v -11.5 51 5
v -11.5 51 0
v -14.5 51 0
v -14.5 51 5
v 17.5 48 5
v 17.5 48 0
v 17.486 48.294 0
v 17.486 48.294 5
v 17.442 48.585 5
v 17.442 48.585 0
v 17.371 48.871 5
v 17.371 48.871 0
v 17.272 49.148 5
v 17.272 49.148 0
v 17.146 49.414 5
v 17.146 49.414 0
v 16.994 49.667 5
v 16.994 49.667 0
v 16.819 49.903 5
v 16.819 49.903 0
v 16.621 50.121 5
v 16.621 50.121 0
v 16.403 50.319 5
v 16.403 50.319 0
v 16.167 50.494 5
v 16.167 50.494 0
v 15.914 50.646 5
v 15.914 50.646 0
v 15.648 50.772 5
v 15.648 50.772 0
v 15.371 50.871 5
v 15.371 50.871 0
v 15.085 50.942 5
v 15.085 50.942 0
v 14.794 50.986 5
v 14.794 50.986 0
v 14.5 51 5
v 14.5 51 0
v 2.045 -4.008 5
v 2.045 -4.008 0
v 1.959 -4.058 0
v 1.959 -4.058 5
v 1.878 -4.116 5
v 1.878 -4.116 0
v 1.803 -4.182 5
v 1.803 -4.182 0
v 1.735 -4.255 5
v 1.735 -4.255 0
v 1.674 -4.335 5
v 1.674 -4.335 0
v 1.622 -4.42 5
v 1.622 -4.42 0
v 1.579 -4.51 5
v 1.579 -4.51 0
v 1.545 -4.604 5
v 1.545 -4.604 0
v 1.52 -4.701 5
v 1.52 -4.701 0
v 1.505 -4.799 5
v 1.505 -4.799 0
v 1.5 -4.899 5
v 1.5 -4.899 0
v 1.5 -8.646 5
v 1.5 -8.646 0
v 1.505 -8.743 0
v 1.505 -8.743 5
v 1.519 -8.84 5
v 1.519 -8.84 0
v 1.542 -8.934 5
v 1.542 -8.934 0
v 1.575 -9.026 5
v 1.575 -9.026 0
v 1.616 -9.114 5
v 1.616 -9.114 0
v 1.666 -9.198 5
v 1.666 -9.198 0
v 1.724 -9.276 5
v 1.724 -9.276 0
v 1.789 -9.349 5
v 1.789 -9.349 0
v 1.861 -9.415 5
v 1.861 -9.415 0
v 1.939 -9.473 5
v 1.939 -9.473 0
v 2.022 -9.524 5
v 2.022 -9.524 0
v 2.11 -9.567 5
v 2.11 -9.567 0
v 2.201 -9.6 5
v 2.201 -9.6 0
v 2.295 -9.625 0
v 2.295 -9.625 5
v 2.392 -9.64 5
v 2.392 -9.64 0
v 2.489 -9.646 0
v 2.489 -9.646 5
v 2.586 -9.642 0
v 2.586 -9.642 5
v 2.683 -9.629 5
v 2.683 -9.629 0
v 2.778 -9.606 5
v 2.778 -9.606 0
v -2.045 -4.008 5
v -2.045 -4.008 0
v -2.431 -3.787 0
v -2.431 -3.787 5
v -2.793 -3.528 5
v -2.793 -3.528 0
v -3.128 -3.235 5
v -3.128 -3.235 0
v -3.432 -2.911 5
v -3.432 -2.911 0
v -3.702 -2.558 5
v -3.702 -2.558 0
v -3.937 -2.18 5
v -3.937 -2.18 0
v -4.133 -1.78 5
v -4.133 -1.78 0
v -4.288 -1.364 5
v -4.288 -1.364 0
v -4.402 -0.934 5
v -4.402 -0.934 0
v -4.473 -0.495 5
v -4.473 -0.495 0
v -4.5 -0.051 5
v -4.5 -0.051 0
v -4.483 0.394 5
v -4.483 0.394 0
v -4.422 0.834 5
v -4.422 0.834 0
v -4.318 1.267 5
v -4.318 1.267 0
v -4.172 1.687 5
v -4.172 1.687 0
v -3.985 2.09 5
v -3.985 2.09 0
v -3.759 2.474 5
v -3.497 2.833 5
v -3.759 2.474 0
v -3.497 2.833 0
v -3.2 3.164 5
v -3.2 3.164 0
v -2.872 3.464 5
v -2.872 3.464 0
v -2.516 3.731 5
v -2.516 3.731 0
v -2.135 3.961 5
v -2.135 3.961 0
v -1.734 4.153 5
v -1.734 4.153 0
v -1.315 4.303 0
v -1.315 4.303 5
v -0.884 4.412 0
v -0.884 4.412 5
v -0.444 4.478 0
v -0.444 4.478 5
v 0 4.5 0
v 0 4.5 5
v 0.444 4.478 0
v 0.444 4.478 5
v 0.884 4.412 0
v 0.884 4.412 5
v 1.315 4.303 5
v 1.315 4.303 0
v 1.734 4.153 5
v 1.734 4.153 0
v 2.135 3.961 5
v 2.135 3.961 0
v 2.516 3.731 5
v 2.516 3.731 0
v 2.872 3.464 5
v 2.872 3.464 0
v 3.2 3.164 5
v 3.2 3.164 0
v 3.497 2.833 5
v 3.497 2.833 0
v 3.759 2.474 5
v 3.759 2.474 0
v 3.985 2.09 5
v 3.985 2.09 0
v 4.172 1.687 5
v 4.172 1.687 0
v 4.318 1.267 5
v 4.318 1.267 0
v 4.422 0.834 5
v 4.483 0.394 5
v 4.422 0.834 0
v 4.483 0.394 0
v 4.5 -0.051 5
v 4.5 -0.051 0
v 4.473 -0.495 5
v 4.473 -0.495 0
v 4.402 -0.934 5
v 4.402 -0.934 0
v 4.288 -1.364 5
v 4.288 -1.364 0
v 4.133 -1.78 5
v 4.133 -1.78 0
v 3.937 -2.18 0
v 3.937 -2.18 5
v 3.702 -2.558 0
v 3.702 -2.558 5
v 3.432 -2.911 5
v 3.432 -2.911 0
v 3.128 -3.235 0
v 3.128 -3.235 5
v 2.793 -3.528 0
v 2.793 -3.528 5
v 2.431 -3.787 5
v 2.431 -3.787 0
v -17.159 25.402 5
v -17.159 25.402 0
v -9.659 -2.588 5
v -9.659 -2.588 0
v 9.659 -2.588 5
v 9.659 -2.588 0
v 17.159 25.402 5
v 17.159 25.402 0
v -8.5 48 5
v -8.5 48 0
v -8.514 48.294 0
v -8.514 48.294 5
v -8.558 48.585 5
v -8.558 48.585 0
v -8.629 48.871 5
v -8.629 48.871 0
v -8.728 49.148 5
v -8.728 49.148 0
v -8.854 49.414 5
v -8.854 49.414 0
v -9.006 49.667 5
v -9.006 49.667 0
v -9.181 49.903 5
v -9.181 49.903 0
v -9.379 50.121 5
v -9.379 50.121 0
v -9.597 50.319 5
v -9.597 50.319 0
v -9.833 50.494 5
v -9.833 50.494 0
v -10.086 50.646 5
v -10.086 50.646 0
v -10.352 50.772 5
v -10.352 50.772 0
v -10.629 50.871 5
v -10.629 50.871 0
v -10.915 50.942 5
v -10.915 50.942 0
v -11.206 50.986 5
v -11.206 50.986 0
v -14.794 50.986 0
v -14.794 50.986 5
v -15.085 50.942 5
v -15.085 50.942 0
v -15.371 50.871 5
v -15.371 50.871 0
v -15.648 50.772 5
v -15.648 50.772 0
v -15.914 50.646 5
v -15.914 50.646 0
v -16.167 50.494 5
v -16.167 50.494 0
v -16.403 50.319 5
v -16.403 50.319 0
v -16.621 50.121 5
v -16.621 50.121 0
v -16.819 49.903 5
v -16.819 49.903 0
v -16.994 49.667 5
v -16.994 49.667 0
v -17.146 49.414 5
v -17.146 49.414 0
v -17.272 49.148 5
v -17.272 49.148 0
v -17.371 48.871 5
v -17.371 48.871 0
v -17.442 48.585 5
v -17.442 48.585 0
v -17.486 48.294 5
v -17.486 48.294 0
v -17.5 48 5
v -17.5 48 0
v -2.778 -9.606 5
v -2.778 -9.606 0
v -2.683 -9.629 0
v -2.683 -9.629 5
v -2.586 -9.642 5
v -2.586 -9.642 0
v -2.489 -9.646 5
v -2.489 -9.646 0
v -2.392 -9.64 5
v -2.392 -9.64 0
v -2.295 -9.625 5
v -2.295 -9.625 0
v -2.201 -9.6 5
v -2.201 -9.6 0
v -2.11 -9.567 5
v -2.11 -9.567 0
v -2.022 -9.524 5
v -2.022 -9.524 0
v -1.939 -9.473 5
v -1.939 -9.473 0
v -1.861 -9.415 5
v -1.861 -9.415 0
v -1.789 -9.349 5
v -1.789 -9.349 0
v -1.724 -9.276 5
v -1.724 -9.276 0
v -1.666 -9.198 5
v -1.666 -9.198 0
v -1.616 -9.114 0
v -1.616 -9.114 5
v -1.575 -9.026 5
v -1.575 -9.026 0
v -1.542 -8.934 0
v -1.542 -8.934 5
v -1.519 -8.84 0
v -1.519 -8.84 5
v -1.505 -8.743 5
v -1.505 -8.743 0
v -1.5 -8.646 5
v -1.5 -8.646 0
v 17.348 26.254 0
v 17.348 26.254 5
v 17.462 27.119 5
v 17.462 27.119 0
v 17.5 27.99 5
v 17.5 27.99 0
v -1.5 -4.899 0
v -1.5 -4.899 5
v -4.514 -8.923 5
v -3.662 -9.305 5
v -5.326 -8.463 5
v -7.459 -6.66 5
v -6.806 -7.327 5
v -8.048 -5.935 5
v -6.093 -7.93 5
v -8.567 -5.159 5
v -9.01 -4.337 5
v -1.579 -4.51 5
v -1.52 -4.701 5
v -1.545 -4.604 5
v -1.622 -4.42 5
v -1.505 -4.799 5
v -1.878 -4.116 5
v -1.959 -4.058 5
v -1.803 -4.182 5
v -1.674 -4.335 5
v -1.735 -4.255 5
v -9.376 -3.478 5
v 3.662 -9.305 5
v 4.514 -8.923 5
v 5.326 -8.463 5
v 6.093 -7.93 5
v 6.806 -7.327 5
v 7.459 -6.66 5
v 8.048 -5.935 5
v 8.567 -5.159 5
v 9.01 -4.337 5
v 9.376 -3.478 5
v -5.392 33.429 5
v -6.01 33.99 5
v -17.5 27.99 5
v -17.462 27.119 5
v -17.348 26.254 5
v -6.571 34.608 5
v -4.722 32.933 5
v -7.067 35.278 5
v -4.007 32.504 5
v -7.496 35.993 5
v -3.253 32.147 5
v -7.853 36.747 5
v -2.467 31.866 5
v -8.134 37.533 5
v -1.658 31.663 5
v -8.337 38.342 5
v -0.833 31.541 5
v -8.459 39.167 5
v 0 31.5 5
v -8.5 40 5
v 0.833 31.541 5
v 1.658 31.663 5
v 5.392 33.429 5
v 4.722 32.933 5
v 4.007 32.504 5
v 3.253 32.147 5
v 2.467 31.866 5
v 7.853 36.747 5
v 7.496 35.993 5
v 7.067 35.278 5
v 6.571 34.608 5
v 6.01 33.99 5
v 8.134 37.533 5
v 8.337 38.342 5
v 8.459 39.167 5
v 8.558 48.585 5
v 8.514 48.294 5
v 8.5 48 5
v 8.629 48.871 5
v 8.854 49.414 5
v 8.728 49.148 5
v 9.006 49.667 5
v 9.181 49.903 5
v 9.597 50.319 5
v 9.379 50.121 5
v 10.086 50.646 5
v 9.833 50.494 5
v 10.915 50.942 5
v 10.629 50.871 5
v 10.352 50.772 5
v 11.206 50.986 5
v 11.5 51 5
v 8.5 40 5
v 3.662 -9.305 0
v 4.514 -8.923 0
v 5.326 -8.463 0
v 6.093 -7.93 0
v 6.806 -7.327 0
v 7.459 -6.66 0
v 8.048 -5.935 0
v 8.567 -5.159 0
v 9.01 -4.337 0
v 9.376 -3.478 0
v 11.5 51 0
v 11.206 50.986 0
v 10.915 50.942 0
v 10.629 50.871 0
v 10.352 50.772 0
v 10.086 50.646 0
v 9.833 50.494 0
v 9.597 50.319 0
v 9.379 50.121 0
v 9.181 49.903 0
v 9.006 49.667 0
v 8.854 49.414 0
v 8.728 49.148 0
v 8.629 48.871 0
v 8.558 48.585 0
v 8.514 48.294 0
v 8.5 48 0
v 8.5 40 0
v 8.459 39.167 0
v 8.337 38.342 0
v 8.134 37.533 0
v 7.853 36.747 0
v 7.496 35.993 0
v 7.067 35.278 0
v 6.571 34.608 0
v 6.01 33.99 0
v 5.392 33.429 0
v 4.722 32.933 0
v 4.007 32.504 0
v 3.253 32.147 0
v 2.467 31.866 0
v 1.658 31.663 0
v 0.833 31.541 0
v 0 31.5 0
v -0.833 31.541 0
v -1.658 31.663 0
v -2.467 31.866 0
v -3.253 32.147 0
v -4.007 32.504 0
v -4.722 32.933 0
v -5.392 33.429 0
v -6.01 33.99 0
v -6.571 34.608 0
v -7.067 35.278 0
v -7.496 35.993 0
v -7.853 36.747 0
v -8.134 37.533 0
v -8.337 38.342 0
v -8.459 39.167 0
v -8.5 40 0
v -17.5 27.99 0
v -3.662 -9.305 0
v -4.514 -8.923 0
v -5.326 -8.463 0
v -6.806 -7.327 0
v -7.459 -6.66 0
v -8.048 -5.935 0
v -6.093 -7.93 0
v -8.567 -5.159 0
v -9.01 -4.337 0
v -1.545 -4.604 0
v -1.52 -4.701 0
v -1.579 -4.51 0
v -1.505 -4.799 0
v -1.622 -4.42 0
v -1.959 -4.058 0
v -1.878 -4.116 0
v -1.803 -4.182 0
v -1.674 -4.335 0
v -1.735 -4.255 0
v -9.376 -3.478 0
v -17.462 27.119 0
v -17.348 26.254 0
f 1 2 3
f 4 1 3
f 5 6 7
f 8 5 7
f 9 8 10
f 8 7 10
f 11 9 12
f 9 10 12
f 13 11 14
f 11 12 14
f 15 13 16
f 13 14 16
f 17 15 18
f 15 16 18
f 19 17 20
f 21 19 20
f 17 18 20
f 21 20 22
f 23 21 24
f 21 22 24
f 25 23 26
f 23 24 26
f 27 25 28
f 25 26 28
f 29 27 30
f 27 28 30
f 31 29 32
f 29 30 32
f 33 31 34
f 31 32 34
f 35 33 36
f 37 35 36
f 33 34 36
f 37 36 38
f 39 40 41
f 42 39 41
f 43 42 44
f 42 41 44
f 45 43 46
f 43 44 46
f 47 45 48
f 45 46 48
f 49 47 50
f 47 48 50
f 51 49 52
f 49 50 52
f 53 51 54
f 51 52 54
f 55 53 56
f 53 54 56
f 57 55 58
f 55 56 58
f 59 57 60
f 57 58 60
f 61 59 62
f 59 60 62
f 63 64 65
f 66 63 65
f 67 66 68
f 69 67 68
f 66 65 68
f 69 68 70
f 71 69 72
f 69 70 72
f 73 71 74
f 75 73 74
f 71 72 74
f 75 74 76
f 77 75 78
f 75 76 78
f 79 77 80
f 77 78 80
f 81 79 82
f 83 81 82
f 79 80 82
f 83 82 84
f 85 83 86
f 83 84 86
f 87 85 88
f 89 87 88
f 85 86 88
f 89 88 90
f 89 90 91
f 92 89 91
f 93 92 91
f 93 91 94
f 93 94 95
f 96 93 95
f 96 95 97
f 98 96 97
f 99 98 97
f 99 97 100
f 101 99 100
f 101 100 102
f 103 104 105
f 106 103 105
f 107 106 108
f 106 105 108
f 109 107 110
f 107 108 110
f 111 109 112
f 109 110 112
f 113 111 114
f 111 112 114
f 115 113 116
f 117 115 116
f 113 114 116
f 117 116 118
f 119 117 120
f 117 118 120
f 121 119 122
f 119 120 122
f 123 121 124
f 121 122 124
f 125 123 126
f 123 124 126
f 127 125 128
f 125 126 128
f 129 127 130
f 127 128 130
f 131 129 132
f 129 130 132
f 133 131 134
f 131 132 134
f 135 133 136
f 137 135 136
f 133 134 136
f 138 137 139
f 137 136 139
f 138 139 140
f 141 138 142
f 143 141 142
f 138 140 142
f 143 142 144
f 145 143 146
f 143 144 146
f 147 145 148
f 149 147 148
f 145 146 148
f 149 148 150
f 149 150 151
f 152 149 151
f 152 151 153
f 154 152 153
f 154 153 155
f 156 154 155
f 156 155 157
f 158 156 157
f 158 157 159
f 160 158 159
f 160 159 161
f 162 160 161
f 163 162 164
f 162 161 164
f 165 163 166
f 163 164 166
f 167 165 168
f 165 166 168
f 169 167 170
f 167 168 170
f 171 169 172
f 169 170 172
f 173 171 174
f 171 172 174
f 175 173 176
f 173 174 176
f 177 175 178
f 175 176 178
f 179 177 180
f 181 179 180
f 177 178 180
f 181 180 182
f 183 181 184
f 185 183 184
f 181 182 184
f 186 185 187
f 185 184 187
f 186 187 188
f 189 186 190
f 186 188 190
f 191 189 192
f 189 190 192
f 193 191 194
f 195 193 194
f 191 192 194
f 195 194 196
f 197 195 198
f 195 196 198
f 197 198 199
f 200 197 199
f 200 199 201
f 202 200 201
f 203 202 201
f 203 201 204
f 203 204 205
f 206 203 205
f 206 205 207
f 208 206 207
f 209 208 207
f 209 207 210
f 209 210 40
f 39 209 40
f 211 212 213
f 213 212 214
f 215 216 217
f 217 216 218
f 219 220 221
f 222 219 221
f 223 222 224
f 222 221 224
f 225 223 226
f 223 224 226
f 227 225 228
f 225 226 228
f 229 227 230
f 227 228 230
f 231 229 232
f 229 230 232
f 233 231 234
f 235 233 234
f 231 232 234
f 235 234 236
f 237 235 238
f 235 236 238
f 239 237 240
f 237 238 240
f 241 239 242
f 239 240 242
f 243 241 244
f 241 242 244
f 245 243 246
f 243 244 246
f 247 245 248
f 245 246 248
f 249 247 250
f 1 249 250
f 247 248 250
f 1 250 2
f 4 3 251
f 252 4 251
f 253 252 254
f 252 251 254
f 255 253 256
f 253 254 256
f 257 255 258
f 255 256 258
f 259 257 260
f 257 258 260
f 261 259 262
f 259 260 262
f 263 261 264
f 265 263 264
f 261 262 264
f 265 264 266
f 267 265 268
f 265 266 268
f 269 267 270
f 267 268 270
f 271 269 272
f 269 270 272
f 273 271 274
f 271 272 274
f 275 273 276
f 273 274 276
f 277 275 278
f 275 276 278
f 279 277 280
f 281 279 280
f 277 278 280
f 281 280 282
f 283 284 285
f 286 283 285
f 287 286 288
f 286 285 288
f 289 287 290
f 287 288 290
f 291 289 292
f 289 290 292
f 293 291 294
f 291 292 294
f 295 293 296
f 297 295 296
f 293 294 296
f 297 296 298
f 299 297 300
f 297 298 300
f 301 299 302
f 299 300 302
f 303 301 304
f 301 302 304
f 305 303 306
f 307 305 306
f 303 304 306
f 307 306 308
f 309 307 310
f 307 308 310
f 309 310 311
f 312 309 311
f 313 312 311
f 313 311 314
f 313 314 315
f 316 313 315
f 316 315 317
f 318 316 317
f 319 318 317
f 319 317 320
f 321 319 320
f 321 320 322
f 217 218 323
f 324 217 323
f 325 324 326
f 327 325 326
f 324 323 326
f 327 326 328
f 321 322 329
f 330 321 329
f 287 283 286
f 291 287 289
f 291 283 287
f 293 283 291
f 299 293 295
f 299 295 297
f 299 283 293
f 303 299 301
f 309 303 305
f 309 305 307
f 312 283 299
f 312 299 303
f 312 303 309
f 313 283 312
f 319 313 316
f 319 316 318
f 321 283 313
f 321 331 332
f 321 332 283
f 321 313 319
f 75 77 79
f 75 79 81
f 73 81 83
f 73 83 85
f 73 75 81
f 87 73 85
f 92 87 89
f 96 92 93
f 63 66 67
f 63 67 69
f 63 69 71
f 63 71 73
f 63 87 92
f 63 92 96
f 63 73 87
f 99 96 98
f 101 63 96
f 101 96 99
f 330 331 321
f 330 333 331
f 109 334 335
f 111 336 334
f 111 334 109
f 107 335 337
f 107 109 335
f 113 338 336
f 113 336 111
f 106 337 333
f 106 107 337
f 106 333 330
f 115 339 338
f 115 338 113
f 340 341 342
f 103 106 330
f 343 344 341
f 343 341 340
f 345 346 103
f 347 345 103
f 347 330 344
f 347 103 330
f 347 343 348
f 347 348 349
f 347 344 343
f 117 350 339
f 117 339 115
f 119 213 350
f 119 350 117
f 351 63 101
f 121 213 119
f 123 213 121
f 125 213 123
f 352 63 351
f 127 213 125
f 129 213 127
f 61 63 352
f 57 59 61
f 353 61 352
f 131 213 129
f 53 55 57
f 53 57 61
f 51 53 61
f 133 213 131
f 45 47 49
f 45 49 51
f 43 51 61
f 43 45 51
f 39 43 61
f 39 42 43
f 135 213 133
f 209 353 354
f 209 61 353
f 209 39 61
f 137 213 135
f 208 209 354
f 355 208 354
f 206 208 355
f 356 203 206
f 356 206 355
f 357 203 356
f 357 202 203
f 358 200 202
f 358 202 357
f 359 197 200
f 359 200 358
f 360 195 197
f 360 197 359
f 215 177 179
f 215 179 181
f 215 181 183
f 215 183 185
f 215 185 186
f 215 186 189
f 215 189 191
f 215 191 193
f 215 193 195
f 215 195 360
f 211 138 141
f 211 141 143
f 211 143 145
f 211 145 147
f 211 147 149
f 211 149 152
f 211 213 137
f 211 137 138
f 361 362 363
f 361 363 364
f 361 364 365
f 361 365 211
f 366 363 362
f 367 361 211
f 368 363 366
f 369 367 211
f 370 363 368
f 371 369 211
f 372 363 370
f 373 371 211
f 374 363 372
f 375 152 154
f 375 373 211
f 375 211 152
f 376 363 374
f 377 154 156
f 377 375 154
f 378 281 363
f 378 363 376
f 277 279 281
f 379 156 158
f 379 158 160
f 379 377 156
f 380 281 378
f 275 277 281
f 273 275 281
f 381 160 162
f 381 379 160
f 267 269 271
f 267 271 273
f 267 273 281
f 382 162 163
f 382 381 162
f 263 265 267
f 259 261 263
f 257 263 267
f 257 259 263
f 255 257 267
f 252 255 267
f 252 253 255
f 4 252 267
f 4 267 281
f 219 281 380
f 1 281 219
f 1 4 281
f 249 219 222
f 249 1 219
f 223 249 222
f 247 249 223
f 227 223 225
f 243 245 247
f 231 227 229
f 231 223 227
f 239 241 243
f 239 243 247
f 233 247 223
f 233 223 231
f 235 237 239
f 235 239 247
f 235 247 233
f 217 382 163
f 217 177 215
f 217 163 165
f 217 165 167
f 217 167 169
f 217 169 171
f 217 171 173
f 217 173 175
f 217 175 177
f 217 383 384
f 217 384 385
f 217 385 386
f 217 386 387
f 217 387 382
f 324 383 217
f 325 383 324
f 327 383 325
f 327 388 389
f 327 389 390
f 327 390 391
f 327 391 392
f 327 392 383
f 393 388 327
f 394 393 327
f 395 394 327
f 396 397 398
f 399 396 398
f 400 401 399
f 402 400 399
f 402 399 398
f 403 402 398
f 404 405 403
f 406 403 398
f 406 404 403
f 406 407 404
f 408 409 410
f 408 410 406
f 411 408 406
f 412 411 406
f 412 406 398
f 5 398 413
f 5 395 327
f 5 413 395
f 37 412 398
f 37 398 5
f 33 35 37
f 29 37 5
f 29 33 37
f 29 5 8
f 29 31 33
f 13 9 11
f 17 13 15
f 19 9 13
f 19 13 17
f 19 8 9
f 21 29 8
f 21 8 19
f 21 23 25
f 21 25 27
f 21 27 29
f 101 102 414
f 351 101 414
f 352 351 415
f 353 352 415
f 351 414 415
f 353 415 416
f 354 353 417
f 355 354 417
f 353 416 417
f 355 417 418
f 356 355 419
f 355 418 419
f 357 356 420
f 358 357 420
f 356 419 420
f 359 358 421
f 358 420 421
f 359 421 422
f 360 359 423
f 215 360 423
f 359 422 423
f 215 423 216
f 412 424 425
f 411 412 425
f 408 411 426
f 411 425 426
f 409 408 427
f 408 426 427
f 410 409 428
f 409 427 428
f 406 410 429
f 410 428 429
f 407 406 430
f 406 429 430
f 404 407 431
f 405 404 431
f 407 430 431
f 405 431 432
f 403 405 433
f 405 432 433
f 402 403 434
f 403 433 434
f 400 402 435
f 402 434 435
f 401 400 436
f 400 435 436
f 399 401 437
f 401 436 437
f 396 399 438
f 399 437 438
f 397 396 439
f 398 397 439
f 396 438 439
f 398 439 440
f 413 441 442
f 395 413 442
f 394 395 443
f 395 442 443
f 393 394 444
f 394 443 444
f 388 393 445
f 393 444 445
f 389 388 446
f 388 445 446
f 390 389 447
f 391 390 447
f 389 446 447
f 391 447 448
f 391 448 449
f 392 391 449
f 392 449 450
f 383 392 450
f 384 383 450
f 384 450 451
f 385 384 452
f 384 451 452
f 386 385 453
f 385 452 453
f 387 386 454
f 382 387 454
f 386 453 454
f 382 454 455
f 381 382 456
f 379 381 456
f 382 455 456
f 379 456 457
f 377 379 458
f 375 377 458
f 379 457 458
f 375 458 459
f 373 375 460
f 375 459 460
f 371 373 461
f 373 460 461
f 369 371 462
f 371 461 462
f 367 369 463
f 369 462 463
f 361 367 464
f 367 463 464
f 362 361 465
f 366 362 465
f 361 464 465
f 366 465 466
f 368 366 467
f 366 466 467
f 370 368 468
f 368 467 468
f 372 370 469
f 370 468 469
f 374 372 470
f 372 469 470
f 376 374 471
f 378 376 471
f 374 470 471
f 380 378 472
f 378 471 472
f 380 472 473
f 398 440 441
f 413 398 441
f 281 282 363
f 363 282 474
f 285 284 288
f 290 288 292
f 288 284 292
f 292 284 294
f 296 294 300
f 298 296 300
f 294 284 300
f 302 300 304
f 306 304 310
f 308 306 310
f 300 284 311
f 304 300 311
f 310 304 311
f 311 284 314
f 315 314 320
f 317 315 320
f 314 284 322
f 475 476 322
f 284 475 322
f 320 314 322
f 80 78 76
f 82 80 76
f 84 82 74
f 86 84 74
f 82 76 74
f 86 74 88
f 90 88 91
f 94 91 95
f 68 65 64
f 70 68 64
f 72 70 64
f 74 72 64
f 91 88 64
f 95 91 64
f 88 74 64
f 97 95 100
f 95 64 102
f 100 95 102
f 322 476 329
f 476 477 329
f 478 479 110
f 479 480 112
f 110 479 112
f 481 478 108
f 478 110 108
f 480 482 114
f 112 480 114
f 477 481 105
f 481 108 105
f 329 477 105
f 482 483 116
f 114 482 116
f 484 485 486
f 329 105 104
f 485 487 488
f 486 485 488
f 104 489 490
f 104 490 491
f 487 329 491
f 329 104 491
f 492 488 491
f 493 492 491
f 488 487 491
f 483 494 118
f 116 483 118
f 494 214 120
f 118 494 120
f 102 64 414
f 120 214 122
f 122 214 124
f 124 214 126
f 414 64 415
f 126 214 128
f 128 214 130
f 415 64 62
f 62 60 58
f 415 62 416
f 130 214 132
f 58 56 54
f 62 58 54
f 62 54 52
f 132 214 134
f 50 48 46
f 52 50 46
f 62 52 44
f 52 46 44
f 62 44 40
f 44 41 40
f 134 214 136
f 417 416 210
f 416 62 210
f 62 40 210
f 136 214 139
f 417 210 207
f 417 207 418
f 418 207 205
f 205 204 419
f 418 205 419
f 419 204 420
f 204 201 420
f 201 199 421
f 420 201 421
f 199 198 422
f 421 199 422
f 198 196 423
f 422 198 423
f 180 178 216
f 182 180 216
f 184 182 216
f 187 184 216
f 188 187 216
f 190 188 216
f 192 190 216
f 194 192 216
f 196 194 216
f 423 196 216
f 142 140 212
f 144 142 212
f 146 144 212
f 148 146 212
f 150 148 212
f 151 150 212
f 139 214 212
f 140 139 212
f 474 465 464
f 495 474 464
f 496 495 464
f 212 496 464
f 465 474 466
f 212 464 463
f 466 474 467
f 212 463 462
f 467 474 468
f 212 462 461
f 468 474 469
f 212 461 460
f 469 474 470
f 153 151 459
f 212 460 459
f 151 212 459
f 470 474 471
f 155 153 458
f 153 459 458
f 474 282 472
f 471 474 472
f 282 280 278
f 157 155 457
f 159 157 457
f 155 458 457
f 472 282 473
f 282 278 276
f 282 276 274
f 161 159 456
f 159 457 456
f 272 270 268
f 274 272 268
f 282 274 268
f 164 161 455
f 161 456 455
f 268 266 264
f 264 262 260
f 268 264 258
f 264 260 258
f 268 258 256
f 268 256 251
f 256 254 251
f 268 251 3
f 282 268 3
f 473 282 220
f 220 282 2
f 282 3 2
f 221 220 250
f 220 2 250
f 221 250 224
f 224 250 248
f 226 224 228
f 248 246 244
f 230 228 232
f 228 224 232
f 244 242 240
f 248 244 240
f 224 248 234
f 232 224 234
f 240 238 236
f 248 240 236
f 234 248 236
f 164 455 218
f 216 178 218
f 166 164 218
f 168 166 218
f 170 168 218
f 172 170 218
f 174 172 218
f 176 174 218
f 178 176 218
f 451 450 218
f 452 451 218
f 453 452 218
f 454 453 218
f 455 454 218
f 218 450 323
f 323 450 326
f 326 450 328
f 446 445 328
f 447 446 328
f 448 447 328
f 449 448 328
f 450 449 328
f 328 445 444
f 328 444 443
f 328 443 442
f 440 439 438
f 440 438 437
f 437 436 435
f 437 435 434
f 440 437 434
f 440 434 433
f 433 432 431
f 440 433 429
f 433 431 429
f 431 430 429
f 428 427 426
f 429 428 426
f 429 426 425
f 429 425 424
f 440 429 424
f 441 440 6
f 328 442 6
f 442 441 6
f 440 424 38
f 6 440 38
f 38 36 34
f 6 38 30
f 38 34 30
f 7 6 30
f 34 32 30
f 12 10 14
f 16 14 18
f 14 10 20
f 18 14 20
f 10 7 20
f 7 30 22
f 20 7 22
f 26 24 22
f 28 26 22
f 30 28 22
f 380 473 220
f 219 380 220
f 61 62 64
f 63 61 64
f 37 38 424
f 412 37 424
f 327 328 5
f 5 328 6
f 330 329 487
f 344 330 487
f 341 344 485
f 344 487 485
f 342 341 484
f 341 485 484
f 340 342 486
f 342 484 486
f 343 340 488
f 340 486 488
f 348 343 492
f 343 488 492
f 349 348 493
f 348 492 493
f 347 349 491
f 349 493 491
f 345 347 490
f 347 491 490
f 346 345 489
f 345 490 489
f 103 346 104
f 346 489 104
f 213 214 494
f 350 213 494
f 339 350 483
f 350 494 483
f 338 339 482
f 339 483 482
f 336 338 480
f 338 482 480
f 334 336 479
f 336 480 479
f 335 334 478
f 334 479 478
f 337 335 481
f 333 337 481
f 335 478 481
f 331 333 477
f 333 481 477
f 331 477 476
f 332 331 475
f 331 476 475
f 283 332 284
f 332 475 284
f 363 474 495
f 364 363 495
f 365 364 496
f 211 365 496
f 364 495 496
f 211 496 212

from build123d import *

# Parameters (mm, degrees)
BASE_EXTRUDE_DEPTH = 5


with BuildPart() as part:
    # Sketch1 → Base-Extrude (new body)
    with BuildSketch(Plane.XY):
        with BuildLine():
            Line((1.5, -4.898979486), (1.5, -8.645808233))
            ThreePointArc((1.5, -8.645808233), (1.899074787, -9.445113487), (2.777777778, -9.606453592))
            ThreePointArc((2.777777778, -9.606453592), (7.140306068, -7.001144853), (9.659258263, -2.588190451))
            Line((9.659258263, -2.588190451), (17.159258263, 25.402190606))
            ThreePointArc((17.159258263, 25.402190606), (17.414448614, 26.685119135), (17.5, 27.990381057))
            Line((17.5, 27.990381057), (17.5, 48))
            ThreePointArc((17.5, 48), (16.621320344, 50.121320344), (14.5, 51))
            Line((14.5, 51), (11.5, 51))
            ThreePointArc((11.5, 51), (9.378679656, 50.121320344), (8.5, 48))
            Line((8.5, 48), (8.5, 40))
            ThreePointArc((8.5, 40), (0, 31.5), (-8.5, 40))
            Line((-8.5, 40), (-8.5, 48))
            ThreePointArc((-8.5, 48), (-9.378679656, 50.121320344), (-11.5, 51))
            Line((-11.5, 51), (-14.5, 51))
            ThreePointArc((-14.5, 51), (-16.621320344, 50.121320344), (-17.5, 48))
            Line((-17.5, 48), (-17.5, 27.990381057))
            ThreePointArc((-17.5, 27.990381057), (-17.414448614, 26.685119135), (-17.159258263, 25.402190606))
            Line((-17.159258263, 25.402190606), (-9.659258263, -2.588190451))
            ThreePointArc((-9.659258263, -2.588190451), (-7.140306068, -7.001144853), (-2.777777778, -9.606453592))
            ThreePointArc((-2.777777778, -9.606453592), (-1.899074787, -9.445113487), (-1.5, -8.645808233))
            Line((-1.5, -8.645808233), (-1.5, -4.898979486))
            ThreePointArc((-1.5, -4.898979486), (-1.647197135, -4.376746518), (-2.045454545, -4.008255943))
            ThreePointArc((-2.045454545, -4.008255943), (0, 4.5), (2.045454545, -4.008255943))
            ThreePointArc((2.045454545, -4.008255943), (1.647197135, -4.376746518), (1.5, -4.898979486))
        make_face()
    extrude(amount=BASE_EXTRUDE_DEPTH)


solid = part.part
